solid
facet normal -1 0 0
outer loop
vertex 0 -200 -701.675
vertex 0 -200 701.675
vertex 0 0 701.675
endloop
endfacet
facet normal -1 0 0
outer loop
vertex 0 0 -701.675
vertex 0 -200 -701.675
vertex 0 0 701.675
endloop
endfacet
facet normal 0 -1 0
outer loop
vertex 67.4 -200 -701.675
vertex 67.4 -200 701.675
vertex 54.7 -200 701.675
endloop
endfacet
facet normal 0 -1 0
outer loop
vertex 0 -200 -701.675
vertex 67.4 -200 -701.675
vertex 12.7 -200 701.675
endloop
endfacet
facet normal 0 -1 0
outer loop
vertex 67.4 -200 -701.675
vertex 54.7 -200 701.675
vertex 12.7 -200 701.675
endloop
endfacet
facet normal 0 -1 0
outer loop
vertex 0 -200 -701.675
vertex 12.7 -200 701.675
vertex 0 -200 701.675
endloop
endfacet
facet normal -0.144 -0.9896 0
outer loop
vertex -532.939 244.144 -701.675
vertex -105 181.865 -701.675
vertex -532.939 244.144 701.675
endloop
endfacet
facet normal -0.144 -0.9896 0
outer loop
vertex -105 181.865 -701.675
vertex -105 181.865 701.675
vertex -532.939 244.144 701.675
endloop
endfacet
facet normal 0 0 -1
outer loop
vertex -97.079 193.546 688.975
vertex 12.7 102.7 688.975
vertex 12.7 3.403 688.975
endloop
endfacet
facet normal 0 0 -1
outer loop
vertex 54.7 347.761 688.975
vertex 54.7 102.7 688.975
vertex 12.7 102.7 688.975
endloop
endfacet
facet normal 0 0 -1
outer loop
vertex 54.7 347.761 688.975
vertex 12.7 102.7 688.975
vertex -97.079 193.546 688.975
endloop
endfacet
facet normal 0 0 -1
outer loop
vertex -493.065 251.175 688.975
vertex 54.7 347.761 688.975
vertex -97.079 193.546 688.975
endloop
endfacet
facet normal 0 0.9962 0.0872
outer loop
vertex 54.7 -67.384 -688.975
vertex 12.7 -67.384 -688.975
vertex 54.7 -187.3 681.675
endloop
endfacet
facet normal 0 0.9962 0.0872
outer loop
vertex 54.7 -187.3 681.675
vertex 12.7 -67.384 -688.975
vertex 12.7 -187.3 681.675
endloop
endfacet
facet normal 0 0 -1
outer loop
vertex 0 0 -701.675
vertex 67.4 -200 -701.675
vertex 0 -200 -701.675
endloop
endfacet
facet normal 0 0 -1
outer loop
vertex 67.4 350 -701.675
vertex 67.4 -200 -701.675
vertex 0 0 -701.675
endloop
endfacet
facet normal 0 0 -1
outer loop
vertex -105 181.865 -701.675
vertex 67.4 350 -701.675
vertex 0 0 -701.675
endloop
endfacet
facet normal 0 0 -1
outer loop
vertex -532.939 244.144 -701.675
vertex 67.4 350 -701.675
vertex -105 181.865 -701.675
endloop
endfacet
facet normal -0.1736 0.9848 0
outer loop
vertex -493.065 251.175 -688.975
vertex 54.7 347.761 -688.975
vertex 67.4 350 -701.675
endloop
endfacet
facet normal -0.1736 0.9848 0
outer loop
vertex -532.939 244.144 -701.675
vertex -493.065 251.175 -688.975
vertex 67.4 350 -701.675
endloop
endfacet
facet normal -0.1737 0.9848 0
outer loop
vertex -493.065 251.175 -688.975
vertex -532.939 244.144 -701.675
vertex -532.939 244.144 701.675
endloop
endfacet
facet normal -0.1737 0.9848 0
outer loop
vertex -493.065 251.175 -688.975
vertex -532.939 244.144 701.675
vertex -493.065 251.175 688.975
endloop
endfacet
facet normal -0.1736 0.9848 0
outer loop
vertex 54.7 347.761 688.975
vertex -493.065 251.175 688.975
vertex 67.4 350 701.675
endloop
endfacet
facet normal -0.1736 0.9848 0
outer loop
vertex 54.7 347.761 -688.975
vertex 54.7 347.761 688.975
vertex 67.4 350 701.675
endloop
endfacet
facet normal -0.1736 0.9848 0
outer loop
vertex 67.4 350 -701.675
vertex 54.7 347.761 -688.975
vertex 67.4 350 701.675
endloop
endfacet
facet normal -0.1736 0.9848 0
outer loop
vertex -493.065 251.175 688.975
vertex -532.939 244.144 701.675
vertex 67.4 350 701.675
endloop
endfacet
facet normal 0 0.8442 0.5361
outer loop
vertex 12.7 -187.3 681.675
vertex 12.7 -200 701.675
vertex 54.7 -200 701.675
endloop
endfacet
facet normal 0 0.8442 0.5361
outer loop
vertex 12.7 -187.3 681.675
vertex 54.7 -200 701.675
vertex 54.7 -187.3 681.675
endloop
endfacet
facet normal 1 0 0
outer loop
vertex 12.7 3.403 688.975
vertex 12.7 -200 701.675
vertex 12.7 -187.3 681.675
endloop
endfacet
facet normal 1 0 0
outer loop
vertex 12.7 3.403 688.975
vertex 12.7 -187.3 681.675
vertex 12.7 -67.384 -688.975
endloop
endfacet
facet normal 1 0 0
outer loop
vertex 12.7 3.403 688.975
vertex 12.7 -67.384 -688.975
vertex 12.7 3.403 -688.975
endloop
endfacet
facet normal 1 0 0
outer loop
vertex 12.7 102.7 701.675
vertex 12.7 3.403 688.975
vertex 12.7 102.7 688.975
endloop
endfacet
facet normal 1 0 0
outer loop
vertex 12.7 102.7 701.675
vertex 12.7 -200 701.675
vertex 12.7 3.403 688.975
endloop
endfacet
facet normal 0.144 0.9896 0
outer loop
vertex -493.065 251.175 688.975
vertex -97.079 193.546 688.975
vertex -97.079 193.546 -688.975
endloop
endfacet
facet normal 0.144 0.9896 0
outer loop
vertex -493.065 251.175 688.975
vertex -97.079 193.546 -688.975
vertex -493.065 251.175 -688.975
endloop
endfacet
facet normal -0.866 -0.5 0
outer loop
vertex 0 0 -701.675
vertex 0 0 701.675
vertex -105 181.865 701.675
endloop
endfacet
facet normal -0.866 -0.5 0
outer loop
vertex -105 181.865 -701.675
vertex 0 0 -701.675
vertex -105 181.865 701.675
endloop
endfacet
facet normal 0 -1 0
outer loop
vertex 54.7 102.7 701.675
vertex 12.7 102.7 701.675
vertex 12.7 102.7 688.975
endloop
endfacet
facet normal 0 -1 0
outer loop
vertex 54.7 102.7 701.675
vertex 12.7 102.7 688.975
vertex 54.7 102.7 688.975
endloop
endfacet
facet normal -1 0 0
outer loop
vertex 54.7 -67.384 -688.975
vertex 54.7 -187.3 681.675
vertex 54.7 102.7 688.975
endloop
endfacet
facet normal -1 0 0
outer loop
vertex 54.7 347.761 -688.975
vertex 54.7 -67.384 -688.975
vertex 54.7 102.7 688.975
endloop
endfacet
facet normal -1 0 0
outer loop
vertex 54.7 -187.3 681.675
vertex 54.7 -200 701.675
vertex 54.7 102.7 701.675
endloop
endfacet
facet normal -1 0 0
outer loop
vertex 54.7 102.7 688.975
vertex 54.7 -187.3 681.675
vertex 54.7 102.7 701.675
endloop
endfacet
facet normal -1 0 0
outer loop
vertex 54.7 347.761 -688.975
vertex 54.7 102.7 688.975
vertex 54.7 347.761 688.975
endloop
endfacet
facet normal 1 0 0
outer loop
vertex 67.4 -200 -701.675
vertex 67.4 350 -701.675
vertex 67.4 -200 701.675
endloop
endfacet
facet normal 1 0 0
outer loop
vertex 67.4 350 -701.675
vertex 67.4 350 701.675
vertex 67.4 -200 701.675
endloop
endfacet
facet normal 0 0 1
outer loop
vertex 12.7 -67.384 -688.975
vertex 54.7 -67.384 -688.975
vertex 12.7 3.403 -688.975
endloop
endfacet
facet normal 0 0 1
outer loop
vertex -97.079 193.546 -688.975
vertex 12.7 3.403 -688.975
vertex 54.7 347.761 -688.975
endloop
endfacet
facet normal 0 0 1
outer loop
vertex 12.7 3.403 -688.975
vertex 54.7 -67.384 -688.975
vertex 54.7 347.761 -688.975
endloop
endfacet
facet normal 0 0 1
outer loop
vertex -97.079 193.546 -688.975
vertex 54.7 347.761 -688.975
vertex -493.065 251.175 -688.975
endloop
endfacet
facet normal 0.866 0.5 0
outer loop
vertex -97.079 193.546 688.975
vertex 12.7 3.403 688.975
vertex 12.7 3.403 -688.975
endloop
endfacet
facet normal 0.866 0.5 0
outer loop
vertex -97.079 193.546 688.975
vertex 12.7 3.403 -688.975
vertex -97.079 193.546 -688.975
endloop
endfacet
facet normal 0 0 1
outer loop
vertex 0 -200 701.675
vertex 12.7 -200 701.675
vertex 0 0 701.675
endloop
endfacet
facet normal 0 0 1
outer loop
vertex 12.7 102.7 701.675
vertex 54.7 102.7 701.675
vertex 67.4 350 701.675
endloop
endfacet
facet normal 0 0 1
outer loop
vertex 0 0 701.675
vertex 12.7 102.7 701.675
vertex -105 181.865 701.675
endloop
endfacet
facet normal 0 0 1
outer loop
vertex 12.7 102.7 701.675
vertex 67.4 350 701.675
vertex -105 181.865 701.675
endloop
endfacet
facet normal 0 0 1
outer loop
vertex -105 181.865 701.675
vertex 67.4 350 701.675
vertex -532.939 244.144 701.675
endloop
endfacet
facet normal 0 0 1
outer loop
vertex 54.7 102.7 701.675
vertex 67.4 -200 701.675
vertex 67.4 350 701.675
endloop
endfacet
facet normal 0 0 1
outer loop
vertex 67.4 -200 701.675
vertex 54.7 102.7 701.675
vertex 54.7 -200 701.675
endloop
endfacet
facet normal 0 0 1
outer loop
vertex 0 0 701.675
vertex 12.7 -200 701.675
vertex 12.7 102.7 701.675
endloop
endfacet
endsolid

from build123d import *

# Parameters (mm, degrees)
BOSS_EXTRUDE1_DEPTH = 701.675
SHELL1_T            = -12.7
SKETCH3_W           = 42
SKETCH3_H           = 290
CUT_EXTRUDE1_DEPTH  = 20
BOSS_EXTRUDE2_REACH = 957.285
CHAMFER1_SIZE       = 12.7
CHAMFER1_SIZE_2     = 20


with BuildPart() as part:
    # Sketch2 → Boss-Extrude1 (new, symmetric)
    with BuildSketch(Plane.XY):
        Polygon((0, 0), (-105, 181.865334795), (-532.938806236, 244.144070894), (67.4, 350), (67.4, -200), (0, -200), align=None)
    extrude(amount=BOSS_EXTRUDE1_DEPTH, both=True)

    # Shell1
    shell1_openings = [part.faces().sort_by_distance(p)[0] for p in [
        (-232.769403118, 297.072035447, 0),
    ]]
    offset(amount=SHELL1_T, openings=shell1_openings, kind=Kind.INTERSECTION)

    # Sketch3 → Cut-Extrude1 (cut)
    with BuildSketch(Plane.XY.offset(701.675)):
        with Locations((33.7, -42.3)):
            Rectangle(SKETCH3_W, SKETCH3_H)
    extrude(amount=-CUT_EXTRUDE1_DEPTH, mode=Mode.SUBTRACT)

    # Sketch4 → Boss-Extrude2 (add, up to next)
    with BuildSketch(Plane(origin=(12.7, 0, 0), x_dir=(0, 0, -1), z_dir=(1, 0, 0)), mode=Mode.PRIVATE) as boss_extrude2_sk1:
        Polygon((688.975, -187.3), (688.975, -67.383663338), (-681.675, -187.3), align=None)
    boss_extrude2_tool1 = extrude(boss_extrude2_sk1.sketch, amount=BOSS_EXTRUDE2_REACH, mode=Mode.PRIVATE) - part.part
    add(boss_extrude2_tool1.solids().sort_by_distance((12.7, -147.327888, -232.091667))[0])

    # Chamfer1
    # the kernel refuses this chamfer: 20, 12.7 mm, written as the material it adds along each edge
    # the kernel refuses this chamfer: 20, 12.7 mm, written as the material it takes off along each edge
    with BuildSketch(Plane(origin=(12.7, -187.3, 701.675), x_dir=(0, -0.9986795899881412, 0.05137194313161755), z_dir=(1, 0, 0))) as chamfer1_2_piece_1:
        Polygon((CHAMFER1_SIZE * 0.998679589988, CHAMFER1_SIZE * 0.0513719431316), (-CHAMFER1_SIZE_2 * 0.0513719431316, CHAMFER1_SIZE_2 * 0.998679589988), (0, 0), align=None)
    extrude(amount=42, mode=Mode.SUBTRACT)


solid = part.part
